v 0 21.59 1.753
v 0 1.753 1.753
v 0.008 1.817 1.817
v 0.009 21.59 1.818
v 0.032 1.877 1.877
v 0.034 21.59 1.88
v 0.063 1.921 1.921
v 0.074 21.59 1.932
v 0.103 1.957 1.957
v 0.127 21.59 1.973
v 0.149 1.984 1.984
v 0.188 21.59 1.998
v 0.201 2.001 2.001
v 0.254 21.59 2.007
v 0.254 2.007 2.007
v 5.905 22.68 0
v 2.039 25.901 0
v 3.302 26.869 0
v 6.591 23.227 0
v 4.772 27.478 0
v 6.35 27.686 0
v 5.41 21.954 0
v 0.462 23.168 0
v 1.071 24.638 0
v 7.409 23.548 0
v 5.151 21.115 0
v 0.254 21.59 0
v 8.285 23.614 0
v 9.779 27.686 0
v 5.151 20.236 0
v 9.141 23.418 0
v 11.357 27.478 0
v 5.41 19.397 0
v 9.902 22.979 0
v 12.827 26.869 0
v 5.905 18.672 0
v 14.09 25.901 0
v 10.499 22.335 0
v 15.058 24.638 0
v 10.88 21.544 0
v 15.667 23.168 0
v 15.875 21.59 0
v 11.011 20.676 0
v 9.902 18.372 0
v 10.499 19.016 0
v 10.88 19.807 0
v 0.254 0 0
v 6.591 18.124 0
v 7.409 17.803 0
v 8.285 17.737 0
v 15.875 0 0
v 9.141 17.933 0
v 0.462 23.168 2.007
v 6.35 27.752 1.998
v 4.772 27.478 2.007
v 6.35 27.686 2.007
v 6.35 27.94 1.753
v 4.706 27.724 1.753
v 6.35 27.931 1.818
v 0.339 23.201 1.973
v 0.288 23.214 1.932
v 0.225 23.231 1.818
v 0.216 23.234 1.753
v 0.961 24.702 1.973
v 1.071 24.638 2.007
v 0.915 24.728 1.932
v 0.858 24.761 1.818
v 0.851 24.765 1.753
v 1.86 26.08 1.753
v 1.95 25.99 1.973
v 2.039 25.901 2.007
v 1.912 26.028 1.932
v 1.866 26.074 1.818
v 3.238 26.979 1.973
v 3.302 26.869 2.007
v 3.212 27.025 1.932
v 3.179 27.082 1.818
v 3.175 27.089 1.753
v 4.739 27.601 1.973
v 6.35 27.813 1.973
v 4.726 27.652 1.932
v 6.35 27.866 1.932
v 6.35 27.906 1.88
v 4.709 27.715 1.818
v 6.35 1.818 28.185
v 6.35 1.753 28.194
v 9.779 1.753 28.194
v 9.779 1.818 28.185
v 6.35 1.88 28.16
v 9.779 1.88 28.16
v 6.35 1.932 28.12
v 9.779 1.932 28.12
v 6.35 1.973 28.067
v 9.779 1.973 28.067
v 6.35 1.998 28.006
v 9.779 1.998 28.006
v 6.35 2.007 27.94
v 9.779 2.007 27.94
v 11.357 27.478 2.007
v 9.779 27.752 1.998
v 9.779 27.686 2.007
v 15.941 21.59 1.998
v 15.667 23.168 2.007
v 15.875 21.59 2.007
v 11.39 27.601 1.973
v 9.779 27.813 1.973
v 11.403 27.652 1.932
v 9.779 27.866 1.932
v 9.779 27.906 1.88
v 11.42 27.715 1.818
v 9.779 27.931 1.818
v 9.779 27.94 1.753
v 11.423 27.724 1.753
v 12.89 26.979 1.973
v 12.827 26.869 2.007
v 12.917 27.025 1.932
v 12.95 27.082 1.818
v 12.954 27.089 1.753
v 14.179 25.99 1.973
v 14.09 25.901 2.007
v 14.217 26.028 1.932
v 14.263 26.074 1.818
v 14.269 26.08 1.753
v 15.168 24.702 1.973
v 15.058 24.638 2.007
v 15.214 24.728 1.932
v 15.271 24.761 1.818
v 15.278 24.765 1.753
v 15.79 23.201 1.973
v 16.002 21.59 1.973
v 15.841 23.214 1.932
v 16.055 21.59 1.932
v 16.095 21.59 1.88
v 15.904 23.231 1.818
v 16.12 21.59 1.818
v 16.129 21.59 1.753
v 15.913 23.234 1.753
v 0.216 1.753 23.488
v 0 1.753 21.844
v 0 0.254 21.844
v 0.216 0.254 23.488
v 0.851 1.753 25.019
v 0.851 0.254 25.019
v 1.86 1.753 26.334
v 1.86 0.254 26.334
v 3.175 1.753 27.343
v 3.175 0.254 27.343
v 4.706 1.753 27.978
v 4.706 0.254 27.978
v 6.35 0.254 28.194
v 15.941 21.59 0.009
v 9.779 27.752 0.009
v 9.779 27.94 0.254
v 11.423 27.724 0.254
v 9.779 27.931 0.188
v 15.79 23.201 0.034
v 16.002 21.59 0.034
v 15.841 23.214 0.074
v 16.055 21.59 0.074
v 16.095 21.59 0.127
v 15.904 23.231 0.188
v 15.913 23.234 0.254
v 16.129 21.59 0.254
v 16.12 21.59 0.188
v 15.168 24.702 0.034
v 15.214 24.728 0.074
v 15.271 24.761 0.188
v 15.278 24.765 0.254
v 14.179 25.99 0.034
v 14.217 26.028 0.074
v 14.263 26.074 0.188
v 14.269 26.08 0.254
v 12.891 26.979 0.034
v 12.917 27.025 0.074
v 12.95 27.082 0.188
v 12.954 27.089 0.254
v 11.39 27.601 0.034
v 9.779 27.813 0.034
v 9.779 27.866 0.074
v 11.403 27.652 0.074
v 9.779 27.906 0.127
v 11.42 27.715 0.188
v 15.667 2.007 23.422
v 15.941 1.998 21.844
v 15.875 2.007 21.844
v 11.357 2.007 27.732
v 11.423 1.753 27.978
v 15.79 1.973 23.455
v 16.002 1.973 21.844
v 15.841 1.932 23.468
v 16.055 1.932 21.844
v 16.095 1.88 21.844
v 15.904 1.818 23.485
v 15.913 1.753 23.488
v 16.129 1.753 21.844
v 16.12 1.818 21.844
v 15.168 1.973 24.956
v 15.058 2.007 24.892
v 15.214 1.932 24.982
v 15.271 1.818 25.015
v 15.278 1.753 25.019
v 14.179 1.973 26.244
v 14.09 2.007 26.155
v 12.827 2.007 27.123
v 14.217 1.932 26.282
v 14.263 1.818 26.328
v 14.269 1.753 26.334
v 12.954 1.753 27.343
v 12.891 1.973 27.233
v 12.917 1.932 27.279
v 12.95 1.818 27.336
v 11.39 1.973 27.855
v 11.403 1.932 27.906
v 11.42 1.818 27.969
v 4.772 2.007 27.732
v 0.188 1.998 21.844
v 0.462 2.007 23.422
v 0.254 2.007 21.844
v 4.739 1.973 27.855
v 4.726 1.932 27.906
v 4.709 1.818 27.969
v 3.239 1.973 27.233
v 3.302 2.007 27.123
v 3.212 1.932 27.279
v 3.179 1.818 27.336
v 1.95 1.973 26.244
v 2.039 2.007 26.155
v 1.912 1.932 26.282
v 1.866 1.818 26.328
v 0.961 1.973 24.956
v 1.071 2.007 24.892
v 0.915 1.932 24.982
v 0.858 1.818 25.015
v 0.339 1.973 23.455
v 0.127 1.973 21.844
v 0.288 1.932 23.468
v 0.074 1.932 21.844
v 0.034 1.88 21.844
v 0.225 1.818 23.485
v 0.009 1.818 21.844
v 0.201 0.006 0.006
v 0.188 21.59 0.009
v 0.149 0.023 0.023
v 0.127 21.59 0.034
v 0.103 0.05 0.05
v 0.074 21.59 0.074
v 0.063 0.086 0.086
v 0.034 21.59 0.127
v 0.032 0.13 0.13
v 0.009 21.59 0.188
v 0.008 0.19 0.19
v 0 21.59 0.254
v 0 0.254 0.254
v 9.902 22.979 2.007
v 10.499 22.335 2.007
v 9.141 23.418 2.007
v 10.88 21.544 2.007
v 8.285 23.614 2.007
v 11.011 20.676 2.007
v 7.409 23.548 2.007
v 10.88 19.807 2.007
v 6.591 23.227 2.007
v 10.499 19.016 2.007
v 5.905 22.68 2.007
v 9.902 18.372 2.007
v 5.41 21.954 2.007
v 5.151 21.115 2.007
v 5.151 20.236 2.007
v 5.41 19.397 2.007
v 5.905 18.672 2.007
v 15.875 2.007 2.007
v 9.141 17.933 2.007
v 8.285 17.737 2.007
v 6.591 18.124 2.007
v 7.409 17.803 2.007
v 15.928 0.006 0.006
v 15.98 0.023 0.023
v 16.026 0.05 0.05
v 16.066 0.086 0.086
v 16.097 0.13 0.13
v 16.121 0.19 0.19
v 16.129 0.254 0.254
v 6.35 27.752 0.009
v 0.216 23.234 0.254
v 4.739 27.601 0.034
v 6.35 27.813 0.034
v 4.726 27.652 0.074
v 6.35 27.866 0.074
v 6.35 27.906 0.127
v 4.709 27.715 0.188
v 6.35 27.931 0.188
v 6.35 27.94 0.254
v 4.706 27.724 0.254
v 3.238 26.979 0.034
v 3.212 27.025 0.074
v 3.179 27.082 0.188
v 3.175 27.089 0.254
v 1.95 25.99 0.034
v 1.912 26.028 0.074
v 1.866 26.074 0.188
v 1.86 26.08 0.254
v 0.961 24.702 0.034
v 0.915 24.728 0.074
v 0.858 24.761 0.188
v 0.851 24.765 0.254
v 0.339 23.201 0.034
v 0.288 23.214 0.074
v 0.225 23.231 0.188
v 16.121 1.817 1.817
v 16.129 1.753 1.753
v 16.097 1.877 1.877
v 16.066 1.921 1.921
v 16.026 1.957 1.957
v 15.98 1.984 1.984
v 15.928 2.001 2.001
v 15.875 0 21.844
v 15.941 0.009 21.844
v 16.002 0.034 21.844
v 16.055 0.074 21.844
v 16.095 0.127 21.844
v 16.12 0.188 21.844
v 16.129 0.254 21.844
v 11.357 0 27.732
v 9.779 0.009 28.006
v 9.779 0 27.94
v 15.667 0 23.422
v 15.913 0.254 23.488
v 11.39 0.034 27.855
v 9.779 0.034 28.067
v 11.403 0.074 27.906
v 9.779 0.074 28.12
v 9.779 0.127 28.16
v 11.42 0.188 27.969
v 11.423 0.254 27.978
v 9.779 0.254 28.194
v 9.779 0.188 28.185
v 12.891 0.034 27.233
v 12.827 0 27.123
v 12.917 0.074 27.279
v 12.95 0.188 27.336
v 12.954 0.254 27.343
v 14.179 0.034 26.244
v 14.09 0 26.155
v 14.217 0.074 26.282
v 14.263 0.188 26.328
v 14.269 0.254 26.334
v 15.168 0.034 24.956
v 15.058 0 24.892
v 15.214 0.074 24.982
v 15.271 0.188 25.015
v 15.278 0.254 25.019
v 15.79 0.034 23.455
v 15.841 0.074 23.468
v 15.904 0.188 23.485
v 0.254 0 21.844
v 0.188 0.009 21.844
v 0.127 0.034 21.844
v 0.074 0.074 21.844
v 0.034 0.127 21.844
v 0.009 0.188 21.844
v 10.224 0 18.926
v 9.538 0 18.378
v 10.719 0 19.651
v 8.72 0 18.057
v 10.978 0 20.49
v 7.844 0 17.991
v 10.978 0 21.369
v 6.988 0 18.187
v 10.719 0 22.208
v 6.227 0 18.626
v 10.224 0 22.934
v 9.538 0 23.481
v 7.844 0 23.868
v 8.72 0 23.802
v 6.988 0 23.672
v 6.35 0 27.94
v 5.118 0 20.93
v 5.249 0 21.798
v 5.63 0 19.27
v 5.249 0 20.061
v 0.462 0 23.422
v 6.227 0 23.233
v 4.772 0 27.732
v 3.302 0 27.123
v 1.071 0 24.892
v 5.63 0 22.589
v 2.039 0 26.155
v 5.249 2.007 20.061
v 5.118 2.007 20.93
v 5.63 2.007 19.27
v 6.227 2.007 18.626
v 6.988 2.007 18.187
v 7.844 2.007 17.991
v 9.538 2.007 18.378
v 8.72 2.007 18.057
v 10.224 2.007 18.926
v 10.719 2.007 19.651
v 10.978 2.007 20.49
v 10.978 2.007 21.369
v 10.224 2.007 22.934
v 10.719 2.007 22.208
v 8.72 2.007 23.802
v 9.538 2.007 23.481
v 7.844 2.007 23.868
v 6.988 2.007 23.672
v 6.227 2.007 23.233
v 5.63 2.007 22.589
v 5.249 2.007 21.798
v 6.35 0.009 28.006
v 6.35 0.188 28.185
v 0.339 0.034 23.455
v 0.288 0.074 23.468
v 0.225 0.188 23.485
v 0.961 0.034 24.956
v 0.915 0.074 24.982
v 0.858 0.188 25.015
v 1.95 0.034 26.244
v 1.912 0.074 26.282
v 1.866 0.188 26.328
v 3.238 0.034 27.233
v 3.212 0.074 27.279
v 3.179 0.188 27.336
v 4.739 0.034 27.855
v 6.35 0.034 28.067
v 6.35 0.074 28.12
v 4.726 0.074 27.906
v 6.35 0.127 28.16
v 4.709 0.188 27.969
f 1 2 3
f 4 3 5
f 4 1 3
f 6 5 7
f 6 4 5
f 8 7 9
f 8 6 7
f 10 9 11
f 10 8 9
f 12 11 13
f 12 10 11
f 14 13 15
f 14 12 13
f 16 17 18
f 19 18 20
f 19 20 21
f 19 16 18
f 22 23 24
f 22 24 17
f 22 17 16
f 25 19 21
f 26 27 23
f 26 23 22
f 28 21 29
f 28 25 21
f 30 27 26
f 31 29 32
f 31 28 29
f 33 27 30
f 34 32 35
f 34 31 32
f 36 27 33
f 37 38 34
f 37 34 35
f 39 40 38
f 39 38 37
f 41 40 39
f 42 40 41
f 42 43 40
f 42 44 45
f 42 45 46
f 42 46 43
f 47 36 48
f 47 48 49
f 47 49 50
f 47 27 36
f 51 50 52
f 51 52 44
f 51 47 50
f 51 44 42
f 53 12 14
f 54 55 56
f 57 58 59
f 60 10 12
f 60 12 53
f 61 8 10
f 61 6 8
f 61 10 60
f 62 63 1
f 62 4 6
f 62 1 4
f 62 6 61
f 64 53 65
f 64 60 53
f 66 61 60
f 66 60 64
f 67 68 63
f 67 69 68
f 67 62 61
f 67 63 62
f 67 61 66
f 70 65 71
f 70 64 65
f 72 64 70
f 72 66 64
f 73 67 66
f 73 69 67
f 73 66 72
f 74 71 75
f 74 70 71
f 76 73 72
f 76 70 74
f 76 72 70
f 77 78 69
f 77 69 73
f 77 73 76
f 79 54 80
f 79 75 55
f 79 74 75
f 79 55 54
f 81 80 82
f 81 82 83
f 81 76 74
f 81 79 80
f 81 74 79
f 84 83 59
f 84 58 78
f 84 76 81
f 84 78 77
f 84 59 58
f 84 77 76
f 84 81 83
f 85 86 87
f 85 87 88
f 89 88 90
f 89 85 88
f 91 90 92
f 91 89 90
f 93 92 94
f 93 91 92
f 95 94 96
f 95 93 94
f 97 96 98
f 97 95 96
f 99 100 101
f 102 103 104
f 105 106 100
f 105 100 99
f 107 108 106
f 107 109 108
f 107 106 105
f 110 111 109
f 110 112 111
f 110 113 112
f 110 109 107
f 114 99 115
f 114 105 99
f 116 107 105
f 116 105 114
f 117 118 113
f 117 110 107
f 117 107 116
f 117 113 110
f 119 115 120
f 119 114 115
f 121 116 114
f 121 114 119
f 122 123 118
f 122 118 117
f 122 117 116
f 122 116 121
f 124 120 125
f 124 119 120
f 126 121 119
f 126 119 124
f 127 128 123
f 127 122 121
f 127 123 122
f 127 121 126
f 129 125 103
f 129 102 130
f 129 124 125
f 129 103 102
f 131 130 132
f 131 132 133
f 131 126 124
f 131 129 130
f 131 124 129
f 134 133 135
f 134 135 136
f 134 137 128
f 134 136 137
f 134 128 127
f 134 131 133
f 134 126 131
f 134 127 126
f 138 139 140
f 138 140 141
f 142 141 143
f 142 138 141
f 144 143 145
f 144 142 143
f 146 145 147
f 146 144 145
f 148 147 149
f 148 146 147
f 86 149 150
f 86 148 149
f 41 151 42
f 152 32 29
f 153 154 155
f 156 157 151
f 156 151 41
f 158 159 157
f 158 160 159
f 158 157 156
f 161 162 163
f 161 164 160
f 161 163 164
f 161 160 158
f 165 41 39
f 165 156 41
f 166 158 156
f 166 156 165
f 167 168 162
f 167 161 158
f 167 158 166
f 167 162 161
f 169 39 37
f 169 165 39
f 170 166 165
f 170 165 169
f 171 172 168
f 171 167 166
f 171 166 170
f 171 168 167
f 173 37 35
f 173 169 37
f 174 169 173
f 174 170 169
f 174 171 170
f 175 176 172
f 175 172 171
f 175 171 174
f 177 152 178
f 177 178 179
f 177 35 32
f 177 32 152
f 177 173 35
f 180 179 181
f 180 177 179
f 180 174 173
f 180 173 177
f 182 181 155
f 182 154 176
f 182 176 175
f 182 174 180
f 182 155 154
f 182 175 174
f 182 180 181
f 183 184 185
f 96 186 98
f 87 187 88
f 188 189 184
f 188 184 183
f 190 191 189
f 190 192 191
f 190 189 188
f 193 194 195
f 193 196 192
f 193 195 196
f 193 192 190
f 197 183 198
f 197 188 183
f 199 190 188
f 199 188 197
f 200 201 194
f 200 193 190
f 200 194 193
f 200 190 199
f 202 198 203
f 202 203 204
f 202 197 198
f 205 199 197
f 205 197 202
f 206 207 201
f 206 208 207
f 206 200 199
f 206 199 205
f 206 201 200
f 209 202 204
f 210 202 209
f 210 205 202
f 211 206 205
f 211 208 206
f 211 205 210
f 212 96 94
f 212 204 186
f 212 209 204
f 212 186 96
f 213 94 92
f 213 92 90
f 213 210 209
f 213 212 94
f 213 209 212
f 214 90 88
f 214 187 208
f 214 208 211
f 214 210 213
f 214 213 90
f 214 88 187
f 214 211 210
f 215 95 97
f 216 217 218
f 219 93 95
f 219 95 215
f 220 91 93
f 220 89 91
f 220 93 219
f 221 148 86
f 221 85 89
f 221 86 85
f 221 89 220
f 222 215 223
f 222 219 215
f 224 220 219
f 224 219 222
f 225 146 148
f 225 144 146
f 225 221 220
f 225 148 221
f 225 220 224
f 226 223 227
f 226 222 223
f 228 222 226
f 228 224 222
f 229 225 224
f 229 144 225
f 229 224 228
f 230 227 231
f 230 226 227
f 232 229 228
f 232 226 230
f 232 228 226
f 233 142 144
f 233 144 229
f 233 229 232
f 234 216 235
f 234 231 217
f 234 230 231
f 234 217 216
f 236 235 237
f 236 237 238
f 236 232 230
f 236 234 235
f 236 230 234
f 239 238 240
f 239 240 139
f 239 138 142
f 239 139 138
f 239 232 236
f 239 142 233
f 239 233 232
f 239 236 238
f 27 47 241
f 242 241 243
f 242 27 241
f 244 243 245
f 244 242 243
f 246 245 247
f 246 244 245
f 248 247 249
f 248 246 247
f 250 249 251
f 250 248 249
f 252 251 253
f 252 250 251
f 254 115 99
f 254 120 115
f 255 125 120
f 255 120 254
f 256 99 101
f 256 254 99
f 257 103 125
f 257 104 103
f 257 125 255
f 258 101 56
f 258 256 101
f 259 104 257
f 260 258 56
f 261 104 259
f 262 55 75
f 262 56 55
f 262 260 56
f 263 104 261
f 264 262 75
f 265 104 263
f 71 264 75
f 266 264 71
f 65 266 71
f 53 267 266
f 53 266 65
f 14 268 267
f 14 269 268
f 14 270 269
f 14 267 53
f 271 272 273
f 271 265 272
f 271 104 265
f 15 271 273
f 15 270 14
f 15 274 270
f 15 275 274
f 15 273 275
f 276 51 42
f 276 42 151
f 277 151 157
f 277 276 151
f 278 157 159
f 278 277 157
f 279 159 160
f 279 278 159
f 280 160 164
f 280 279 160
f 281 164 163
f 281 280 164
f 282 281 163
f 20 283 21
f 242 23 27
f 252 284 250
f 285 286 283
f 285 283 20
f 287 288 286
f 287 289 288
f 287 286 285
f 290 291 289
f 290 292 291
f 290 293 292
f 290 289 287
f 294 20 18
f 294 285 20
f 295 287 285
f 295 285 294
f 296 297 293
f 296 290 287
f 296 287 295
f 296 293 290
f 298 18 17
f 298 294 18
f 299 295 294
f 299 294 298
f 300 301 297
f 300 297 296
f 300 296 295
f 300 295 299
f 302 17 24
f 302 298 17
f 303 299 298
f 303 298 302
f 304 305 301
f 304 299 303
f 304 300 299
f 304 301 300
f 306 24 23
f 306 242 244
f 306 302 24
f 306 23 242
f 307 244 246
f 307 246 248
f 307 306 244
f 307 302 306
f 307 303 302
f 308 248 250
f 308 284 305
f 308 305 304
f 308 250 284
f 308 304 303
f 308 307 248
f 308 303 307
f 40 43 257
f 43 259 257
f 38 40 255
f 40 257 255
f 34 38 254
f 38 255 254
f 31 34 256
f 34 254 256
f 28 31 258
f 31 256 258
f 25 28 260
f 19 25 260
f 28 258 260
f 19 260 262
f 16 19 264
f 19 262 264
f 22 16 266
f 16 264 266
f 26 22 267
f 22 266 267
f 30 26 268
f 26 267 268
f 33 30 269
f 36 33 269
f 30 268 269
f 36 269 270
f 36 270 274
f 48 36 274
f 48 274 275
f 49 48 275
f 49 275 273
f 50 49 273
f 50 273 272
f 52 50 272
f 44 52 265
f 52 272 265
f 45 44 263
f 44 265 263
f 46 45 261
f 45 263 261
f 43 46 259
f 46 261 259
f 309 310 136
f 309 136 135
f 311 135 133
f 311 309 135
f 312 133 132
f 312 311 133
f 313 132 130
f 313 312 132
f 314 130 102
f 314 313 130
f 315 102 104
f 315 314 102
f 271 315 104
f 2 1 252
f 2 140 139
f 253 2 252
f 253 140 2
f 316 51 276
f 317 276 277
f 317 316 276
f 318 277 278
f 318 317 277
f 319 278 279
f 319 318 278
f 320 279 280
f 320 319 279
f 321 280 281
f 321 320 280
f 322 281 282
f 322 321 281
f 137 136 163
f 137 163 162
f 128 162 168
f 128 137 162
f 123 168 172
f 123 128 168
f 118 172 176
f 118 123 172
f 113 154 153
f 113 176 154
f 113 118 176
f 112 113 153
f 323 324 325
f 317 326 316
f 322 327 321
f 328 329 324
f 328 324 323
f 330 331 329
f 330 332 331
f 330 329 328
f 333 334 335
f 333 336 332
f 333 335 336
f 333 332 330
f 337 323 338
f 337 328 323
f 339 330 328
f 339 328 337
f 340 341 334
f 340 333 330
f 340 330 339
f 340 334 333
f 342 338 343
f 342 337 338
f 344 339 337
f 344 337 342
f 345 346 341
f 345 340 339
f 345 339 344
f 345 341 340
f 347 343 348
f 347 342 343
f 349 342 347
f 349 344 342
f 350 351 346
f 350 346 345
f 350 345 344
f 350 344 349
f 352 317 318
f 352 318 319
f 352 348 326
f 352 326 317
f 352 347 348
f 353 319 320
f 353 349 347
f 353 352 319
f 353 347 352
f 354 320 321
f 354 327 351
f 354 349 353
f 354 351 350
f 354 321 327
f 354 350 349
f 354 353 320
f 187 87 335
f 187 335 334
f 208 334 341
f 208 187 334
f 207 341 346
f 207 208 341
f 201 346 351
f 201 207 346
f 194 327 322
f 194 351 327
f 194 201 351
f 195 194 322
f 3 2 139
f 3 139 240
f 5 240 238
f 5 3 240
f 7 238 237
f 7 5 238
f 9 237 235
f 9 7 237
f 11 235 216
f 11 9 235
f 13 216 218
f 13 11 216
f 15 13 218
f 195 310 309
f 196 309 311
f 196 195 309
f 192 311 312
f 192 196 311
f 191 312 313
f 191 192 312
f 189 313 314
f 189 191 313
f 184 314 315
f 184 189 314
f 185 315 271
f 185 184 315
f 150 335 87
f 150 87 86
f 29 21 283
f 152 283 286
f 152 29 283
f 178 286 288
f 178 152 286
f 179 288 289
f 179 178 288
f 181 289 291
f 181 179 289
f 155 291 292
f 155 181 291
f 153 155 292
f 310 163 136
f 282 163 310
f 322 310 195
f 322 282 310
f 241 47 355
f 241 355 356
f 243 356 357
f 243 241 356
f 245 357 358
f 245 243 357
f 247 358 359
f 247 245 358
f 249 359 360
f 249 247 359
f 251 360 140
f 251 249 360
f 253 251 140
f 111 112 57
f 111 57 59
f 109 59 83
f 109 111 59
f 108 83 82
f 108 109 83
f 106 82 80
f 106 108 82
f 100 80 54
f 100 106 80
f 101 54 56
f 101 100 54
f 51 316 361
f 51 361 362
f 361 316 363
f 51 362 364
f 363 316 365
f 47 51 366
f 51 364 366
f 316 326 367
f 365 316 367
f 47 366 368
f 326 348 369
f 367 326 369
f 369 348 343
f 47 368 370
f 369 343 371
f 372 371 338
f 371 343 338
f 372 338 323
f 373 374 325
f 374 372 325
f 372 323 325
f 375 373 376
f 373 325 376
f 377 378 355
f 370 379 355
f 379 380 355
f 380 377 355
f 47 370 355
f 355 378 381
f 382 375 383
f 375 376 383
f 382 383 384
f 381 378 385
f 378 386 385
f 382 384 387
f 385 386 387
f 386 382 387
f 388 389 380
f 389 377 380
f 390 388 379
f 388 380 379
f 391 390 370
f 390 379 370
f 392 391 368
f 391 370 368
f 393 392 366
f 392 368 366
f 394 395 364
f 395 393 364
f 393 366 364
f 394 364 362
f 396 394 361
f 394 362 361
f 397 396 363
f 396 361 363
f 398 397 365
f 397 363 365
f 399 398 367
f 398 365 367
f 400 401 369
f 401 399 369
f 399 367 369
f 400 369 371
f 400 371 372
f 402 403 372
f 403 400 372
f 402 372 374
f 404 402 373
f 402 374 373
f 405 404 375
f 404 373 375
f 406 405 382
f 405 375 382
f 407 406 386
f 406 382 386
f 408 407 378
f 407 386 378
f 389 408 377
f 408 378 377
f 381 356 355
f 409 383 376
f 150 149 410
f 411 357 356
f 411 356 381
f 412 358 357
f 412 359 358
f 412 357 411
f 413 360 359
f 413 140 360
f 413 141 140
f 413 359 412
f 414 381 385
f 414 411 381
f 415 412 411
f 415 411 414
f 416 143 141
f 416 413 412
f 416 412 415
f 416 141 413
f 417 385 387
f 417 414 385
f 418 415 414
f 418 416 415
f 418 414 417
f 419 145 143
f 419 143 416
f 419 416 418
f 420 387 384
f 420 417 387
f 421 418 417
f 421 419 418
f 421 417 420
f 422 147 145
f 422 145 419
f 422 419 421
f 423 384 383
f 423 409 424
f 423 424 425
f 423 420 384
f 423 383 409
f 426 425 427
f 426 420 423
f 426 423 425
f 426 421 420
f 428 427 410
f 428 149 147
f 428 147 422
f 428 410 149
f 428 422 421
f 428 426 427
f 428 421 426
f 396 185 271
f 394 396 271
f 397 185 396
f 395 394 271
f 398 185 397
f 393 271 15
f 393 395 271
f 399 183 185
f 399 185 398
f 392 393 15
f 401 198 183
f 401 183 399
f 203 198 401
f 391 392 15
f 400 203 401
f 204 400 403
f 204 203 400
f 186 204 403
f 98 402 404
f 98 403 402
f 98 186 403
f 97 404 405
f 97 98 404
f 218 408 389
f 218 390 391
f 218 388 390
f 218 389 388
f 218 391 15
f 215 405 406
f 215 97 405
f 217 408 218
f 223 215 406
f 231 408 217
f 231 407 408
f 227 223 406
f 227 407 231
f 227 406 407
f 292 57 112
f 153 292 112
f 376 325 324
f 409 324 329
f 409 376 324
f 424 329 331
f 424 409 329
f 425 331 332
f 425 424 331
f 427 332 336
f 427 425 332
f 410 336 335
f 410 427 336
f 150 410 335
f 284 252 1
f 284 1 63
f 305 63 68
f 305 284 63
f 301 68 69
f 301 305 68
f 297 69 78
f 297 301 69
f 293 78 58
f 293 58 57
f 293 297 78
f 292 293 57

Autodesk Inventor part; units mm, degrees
ref_plane "YZ Plane" through (0, 0, 0) normal (1, 0, 0) x (0, 1, 0)
ref_plane "XZ Plane" through (0, 0, 0) normal (0, 1, 0) x (-1, 0, 0)
ref_plane "XY Plane" through (0, 0, 0) normal (0, 0, 1) x (1, 0, 0)
sketch "Sketch1" plane through (0, 0, 0) normal (0, 1, 0) x (-1, 0, 0)
  point P0 (0, 0)
sketch "Sketch2" plane through (0, 0, 0) normal (0, 1, 0) x (-1, 0, 0)
  line L0 (0, 0) -> (-16.129, 0)
  line L1 (-16.129, 0) -> (-16.129, 28.194)
  line L2 (-16.129, 28.194) -> (0, 28.194)
  line L3 (0, 28.194) -> (0, 0)
  circle A0 centre (-8.0645, 20.9296) radius 2.9464
  point P0 (-8.0645, 28.194)
  dimension "d0" = 16.129
  dimension "d1" = 28.194
  dimension "d3" = 5.8928
  dimension "d4" = 7.2644
extrude "Extrusion1" add sketch "Sketch2" along normal blind 2.0066
sketch "Sketch3" plane through (0, 0, 0) normal (0, -1, 0) x (1, 0, 0)
  line L0 (16.129, 0) -> (0, 0) projected
  line L1 (0, 0) -> (16.129, 0)
  line L2 (16.129, 0) -> (16.129, 2.0066)
  line L3 (16.129, 2.0066) -> (0, 2.0066)
  line L4 (0, 2.0066) -> (0, 0)
  point P0 (8.0645, 2.0066)
  dimension "d7" = 2.0066
extrude "Extrusion2" add sketch "Sketch3" against normal blind 27.94
fillet "Fillet1" radius 6.35 2 edges at (16.129, 1.0033, 28.194) (0, 1.0033, 28.194)
sketch "Sketch4" plane through (0, 2.0066, 2.0066) normal (0, 0, 1) x (1, 0, 0)
  circle A0 centre (8.0645, 18.669) radius 2.9464
  line L0 (0, 25.9334) -> (16.129, 25.9334) projected
  point P0 (0, -2.0066)
  point P1 (8.0645, 25.9334)
  dimension "d11" = 5.8928
  dimension "d12" = 7.2644
fillet "Fillet2" radius 6.35 2 edges at (0, 27.94, 1.0033) (16.129, 27.94, 1.0033)
extrude "Extrusion3" cut sketch "Sketch4" against normal blind 2.0066
fillet "Fillet3" radius 0.254 20 edges at (14.2691, 2.0066, 26.3341) (8.0645, 2.0066, 28.194) (1.8599, 2.0066, 26.3341) (0, 2.0066, 11.9253) (16.129, 2.0066, 11.9253) (14.2691, 0, 26.3341) (8.0645, 0, 28.194) (1.8599, 0, 26.3341) (0, 0, 10.922) (16.129, 0, 10.922) (14.2691, 26.0801, 2.0066) (8.0645, 27.94, 2.0066) (1.8599, 26.0801, 2.0066) (0, 11.7983, 2.0066) (16.129, 11.7983, 2.0066) (14.2691, 26.0801, 0) (8.0645, 27.94, 0) (1.8599, 26.0801, 0) (0, 10.795, 0) (16.129, 10.795, 0)
properties part number "Right Angle"
